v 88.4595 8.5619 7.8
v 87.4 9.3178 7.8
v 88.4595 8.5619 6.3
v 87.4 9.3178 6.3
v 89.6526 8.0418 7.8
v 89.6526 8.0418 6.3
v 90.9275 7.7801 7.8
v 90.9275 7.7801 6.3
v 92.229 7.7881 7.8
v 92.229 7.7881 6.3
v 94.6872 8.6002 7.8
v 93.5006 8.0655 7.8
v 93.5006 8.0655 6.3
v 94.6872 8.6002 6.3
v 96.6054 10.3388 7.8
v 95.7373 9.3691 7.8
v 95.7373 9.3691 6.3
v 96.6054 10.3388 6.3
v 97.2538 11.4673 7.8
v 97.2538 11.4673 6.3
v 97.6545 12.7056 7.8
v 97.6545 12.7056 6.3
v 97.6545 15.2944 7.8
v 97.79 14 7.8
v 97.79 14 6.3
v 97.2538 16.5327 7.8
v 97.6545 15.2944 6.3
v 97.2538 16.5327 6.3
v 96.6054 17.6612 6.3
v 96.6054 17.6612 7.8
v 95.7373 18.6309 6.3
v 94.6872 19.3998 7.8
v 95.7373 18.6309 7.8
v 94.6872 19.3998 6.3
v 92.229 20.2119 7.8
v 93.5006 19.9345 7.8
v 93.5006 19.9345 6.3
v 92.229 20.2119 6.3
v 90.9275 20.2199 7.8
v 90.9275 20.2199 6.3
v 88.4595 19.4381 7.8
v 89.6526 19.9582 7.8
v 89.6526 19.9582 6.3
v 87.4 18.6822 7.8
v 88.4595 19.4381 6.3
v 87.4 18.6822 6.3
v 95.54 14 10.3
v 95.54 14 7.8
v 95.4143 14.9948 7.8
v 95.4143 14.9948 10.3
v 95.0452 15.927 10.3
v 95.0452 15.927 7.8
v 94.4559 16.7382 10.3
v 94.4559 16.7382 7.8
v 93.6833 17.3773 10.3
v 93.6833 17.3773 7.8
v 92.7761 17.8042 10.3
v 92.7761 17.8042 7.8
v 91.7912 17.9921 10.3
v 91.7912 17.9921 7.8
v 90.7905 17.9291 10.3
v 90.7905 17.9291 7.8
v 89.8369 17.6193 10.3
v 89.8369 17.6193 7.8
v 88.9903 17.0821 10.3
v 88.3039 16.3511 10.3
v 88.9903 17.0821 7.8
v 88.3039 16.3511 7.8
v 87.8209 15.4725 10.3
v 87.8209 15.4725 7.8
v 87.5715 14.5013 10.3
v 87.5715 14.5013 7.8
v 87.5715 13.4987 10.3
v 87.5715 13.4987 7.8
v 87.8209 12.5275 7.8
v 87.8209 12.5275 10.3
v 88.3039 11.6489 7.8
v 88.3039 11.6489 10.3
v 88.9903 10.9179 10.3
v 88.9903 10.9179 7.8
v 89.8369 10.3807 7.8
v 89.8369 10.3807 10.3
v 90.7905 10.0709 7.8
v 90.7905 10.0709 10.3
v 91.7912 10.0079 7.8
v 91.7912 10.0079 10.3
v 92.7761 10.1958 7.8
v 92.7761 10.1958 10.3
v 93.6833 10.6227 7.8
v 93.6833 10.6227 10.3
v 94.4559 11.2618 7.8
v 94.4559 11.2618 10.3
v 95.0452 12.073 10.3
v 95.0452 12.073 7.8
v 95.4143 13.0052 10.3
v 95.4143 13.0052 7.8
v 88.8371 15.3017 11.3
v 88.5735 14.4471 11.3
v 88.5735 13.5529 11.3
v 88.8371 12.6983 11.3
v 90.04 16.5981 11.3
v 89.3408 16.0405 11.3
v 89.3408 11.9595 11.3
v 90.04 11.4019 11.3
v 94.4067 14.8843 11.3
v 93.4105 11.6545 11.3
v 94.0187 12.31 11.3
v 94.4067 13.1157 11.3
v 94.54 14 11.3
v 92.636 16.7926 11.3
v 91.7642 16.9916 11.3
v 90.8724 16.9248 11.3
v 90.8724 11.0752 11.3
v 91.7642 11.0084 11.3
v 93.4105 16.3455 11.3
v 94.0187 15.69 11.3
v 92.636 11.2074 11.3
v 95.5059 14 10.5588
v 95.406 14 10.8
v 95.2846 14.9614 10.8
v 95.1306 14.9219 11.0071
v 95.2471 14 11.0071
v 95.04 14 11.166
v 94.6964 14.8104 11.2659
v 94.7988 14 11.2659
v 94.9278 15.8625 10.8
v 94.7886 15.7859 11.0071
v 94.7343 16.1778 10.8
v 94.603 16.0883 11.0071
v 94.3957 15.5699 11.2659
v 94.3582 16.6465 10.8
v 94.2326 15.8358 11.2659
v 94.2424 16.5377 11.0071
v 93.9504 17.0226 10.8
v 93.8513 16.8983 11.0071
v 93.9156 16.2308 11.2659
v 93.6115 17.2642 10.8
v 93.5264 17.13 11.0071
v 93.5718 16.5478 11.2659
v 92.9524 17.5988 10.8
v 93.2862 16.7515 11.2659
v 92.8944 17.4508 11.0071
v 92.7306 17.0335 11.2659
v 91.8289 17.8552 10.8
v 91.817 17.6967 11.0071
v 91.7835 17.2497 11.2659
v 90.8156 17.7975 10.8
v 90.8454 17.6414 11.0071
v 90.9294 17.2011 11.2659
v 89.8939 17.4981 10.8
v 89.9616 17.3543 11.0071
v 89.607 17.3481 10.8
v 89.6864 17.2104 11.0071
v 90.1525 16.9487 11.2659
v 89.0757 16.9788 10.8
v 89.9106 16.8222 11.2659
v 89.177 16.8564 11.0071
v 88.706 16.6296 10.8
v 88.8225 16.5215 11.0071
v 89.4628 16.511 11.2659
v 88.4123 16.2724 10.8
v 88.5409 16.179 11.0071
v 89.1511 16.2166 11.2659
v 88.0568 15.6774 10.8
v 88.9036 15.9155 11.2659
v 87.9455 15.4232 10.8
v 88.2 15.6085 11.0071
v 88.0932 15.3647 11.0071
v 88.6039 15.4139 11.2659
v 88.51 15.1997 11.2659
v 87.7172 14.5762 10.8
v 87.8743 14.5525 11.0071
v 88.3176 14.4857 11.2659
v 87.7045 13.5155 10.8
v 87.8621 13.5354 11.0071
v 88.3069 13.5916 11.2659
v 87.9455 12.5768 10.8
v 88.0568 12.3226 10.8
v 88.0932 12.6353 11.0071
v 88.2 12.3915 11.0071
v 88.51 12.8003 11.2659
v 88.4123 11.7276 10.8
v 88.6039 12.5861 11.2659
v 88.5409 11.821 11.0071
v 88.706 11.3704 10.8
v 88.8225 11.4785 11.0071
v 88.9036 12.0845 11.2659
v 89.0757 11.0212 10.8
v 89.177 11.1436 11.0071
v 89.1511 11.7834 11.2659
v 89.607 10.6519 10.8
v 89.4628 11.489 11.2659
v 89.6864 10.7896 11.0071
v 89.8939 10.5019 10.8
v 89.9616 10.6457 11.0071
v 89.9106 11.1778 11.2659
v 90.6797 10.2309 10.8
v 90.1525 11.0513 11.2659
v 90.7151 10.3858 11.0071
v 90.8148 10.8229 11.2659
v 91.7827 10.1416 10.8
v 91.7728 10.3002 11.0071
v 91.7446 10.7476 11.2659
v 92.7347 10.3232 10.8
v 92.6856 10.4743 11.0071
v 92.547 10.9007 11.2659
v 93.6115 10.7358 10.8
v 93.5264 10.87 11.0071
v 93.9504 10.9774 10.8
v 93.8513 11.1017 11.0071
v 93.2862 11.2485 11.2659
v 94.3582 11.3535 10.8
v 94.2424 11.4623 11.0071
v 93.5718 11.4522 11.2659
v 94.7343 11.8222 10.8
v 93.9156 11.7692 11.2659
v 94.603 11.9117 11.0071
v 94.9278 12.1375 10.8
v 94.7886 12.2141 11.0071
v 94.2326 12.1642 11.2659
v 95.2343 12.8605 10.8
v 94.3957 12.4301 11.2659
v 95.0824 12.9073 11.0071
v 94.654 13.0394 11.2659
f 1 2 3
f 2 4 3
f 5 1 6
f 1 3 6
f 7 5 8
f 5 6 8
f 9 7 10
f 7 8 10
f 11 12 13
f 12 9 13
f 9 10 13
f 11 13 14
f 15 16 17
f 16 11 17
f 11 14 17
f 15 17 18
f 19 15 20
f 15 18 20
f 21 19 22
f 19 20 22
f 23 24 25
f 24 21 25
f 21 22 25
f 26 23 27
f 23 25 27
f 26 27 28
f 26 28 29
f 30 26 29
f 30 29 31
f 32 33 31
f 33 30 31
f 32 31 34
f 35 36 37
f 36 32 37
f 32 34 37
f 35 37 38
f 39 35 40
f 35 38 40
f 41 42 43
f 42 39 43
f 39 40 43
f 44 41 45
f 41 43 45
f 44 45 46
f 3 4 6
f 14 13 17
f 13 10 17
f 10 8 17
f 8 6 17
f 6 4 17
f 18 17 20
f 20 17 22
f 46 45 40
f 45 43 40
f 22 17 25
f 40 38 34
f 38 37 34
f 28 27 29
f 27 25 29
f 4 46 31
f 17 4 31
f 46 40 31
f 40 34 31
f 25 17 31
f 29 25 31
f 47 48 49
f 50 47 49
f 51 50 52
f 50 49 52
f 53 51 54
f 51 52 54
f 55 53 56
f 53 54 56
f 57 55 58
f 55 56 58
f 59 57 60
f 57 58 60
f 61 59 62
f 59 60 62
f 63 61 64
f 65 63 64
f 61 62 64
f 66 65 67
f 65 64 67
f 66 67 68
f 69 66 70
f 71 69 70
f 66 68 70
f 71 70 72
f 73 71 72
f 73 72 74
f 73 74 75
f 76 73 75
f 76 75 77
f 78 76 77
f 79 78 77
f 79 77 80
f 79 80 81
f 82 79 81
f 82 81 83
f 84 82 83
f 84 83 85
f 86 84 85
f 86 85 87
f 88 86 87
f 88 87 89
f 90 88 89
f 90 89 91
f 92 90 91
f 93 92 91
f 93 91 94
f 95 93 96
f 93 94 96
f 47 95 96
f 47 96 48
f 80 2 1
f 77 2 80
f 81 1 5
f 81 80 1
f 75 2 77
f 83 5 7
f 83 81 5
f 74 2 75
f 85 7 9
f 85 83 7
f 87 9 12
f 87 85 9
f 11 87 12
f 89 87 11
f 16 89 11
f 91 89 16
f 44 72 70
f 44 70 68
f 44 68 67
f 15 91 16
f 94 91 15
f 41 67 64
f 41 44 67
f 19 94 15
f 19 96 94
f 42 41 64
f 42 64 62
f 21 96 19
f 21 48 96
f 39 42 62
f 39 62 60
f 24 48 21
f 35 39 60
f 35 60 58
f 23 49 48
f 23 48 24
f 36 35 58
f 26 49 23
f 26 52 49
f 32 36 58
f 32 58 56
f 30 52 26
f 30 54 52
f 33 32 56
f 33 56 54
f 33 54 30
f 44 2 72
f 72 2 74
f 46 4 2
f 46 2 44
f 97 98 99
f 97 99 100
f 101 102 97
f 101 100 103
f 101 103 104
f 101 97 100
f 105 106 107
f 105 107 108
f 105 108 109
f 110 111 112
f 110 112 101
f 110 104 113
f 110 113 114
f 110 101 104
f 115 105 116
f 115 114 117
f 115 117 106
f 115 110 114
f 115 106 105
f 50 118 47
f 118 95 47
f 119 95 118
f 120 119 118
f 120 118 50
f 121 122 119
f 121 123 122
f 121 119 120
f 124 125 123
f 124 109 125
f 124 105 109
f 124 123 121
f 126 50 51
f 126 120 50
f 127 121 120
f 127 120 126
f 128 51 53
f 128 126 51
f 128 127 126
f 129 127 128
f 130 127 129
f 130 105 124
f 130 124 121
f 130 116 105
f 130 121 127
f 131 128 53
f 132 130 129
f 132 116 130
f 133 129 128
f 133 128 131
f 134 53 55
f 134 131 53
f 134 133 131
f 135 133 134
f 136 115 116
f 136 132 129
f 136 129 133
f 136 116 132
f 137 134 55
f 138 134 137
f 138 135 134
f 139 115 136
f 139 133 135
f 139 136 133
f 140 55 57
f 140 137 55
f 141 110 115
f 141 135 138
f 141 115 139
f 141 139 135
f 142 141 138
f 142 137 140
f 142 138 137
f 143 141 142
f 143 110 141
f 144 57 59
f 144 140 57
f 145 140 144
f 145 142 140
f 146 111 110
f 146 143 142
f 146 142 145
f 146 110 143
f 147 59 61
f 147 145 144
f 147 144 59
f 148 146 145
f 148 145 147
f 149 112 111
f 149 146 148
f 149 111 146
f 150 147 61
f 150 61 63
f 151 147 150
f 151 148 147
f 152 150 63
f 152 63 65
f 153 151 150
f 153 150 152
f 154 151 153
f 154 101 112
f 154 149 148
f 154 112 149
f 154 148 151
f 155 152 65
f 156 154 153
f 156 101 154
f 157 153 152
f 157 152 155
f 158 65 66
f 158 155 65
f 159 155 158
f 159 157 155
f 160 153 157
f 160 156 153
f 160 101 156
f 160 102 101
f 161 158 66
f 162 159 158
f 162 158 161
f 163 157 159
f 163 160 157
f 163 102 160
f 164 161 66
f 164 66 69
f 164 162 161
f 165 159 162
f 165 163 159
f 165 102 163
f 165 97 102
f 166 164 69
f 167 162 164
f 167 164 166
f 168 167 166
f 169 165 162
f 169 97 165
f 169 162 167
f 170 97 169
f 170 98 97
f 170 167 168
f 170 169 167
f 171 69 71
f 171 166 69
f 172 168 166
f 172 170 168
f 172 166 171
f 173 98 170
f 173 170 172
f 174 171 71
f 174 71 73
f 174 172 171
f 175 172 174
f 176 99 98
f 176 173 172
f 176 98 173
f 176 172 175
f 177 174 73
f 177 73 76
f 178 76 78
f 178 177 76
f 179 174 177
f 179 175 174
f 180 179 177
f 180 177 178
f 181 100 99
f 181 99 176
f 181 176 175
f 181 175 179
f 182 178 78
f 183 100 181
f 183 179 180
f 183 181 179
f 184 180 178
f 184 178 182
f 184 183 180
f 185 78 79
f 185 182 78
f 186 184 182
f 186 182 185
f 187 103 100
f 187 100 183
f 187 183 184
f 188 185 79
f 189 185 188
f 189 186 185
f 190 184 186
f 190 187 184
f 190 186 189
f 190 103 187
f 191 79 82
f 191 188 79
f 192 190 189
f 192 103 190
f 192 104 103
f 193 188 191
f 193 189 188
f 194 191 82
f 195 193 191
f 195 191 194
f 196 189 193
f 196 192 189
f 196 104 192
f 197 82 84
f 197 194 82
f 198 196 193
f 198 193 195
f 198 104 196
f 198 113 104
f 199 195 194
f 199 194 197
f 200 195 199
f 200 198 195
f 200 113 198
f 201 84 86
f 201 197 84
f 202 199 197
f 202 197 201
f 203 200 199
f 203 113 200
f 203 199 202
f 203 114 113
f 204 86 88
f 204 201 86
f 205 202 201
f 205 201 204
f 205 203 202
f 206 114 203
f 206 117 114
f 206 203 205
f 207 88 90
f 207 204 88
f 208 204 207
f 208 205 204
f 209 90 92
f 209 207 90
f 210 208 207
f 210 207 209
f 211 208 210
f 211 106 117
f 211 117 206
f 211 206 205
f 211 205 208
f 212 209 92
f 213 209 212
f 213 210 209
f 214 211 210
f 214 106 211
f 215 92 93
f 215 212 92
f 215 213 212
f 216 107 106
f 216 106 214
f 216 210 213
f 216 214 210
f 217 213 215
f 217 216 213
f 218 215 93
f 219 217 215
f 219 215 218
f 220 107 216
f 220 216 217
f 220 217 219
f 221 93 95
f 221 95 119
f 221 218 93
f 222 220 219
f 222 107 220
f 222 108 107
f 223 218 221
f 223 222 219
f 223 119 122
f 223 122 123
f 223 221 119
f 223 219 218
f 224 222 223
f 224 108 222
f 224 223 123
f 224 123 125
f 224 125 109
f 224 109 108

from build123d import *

# Parameters (mm, degrees)
BOX115_W          = 10
BOX115_H          = 10
BOX115_DEPTH      = 10
CYLINDER017_R     = 4
CYLINDER017_DEPTH = 5
FILLET002_R       = 1
CYLINDER016_R     = 6.25
CYLINDER016_DEPTH = 1.5


with BuildPart() as cube105:
    # Box115 → Box115 (new body)
    with BuildSketch(Plane(origin=(77.4, 9, 0), x_dir=(1, 0, 0), z_dir=(0, 0, 1))):
        with Locations((5, 5)):
            Rectangle(BOX115_W, BOX115_H)
    extrude(amount=BOX115_DEPTH)


with BuildPart() as btn4_top:
    # Cylinder017 → Cylinder017 (new body)
    with BuildSketch(Plane(origin=(109.54, 14, 6.3), x_dir=(1, 0, 0), z_dir=(0, 0, 1))):
        Circle(CYLINDER017_R)
    extrude(amount=CYLINDER017_DEPTH)

    # Fillet002
    fillet002_edges = [btn4_top.edges().sort_by_distance(p)[0] for p in [
        (105.54, 14, 11.3),
    ]]
    fillet(fillet002_edges, radius=FILLET002_R)


with BuildPart() as cut071:
    # Cylinder016 → Cylinder016 (new body)
    with BuildSketch(Plane(origin=(109.54, 14, 6.3), x_dir=(1, 0, 0), z_dir=(0, 0, 1))):
        Circle(CYLINDER016_R)
    extrude(amount=CYLINDER016_DEPTH)

    # Fusion016: union Btn4_Top
    add(btn4_top.part)


with BuildPart() as cut071_1:
    # Fusion016 placement: moved
    add(cut071.part.moved(Location((-18, 0, 0))))

    # Cut071: cut Cube105
    add(cube105.part, mode=Mode.SUBTRACT)


solid = cut071_1.part
